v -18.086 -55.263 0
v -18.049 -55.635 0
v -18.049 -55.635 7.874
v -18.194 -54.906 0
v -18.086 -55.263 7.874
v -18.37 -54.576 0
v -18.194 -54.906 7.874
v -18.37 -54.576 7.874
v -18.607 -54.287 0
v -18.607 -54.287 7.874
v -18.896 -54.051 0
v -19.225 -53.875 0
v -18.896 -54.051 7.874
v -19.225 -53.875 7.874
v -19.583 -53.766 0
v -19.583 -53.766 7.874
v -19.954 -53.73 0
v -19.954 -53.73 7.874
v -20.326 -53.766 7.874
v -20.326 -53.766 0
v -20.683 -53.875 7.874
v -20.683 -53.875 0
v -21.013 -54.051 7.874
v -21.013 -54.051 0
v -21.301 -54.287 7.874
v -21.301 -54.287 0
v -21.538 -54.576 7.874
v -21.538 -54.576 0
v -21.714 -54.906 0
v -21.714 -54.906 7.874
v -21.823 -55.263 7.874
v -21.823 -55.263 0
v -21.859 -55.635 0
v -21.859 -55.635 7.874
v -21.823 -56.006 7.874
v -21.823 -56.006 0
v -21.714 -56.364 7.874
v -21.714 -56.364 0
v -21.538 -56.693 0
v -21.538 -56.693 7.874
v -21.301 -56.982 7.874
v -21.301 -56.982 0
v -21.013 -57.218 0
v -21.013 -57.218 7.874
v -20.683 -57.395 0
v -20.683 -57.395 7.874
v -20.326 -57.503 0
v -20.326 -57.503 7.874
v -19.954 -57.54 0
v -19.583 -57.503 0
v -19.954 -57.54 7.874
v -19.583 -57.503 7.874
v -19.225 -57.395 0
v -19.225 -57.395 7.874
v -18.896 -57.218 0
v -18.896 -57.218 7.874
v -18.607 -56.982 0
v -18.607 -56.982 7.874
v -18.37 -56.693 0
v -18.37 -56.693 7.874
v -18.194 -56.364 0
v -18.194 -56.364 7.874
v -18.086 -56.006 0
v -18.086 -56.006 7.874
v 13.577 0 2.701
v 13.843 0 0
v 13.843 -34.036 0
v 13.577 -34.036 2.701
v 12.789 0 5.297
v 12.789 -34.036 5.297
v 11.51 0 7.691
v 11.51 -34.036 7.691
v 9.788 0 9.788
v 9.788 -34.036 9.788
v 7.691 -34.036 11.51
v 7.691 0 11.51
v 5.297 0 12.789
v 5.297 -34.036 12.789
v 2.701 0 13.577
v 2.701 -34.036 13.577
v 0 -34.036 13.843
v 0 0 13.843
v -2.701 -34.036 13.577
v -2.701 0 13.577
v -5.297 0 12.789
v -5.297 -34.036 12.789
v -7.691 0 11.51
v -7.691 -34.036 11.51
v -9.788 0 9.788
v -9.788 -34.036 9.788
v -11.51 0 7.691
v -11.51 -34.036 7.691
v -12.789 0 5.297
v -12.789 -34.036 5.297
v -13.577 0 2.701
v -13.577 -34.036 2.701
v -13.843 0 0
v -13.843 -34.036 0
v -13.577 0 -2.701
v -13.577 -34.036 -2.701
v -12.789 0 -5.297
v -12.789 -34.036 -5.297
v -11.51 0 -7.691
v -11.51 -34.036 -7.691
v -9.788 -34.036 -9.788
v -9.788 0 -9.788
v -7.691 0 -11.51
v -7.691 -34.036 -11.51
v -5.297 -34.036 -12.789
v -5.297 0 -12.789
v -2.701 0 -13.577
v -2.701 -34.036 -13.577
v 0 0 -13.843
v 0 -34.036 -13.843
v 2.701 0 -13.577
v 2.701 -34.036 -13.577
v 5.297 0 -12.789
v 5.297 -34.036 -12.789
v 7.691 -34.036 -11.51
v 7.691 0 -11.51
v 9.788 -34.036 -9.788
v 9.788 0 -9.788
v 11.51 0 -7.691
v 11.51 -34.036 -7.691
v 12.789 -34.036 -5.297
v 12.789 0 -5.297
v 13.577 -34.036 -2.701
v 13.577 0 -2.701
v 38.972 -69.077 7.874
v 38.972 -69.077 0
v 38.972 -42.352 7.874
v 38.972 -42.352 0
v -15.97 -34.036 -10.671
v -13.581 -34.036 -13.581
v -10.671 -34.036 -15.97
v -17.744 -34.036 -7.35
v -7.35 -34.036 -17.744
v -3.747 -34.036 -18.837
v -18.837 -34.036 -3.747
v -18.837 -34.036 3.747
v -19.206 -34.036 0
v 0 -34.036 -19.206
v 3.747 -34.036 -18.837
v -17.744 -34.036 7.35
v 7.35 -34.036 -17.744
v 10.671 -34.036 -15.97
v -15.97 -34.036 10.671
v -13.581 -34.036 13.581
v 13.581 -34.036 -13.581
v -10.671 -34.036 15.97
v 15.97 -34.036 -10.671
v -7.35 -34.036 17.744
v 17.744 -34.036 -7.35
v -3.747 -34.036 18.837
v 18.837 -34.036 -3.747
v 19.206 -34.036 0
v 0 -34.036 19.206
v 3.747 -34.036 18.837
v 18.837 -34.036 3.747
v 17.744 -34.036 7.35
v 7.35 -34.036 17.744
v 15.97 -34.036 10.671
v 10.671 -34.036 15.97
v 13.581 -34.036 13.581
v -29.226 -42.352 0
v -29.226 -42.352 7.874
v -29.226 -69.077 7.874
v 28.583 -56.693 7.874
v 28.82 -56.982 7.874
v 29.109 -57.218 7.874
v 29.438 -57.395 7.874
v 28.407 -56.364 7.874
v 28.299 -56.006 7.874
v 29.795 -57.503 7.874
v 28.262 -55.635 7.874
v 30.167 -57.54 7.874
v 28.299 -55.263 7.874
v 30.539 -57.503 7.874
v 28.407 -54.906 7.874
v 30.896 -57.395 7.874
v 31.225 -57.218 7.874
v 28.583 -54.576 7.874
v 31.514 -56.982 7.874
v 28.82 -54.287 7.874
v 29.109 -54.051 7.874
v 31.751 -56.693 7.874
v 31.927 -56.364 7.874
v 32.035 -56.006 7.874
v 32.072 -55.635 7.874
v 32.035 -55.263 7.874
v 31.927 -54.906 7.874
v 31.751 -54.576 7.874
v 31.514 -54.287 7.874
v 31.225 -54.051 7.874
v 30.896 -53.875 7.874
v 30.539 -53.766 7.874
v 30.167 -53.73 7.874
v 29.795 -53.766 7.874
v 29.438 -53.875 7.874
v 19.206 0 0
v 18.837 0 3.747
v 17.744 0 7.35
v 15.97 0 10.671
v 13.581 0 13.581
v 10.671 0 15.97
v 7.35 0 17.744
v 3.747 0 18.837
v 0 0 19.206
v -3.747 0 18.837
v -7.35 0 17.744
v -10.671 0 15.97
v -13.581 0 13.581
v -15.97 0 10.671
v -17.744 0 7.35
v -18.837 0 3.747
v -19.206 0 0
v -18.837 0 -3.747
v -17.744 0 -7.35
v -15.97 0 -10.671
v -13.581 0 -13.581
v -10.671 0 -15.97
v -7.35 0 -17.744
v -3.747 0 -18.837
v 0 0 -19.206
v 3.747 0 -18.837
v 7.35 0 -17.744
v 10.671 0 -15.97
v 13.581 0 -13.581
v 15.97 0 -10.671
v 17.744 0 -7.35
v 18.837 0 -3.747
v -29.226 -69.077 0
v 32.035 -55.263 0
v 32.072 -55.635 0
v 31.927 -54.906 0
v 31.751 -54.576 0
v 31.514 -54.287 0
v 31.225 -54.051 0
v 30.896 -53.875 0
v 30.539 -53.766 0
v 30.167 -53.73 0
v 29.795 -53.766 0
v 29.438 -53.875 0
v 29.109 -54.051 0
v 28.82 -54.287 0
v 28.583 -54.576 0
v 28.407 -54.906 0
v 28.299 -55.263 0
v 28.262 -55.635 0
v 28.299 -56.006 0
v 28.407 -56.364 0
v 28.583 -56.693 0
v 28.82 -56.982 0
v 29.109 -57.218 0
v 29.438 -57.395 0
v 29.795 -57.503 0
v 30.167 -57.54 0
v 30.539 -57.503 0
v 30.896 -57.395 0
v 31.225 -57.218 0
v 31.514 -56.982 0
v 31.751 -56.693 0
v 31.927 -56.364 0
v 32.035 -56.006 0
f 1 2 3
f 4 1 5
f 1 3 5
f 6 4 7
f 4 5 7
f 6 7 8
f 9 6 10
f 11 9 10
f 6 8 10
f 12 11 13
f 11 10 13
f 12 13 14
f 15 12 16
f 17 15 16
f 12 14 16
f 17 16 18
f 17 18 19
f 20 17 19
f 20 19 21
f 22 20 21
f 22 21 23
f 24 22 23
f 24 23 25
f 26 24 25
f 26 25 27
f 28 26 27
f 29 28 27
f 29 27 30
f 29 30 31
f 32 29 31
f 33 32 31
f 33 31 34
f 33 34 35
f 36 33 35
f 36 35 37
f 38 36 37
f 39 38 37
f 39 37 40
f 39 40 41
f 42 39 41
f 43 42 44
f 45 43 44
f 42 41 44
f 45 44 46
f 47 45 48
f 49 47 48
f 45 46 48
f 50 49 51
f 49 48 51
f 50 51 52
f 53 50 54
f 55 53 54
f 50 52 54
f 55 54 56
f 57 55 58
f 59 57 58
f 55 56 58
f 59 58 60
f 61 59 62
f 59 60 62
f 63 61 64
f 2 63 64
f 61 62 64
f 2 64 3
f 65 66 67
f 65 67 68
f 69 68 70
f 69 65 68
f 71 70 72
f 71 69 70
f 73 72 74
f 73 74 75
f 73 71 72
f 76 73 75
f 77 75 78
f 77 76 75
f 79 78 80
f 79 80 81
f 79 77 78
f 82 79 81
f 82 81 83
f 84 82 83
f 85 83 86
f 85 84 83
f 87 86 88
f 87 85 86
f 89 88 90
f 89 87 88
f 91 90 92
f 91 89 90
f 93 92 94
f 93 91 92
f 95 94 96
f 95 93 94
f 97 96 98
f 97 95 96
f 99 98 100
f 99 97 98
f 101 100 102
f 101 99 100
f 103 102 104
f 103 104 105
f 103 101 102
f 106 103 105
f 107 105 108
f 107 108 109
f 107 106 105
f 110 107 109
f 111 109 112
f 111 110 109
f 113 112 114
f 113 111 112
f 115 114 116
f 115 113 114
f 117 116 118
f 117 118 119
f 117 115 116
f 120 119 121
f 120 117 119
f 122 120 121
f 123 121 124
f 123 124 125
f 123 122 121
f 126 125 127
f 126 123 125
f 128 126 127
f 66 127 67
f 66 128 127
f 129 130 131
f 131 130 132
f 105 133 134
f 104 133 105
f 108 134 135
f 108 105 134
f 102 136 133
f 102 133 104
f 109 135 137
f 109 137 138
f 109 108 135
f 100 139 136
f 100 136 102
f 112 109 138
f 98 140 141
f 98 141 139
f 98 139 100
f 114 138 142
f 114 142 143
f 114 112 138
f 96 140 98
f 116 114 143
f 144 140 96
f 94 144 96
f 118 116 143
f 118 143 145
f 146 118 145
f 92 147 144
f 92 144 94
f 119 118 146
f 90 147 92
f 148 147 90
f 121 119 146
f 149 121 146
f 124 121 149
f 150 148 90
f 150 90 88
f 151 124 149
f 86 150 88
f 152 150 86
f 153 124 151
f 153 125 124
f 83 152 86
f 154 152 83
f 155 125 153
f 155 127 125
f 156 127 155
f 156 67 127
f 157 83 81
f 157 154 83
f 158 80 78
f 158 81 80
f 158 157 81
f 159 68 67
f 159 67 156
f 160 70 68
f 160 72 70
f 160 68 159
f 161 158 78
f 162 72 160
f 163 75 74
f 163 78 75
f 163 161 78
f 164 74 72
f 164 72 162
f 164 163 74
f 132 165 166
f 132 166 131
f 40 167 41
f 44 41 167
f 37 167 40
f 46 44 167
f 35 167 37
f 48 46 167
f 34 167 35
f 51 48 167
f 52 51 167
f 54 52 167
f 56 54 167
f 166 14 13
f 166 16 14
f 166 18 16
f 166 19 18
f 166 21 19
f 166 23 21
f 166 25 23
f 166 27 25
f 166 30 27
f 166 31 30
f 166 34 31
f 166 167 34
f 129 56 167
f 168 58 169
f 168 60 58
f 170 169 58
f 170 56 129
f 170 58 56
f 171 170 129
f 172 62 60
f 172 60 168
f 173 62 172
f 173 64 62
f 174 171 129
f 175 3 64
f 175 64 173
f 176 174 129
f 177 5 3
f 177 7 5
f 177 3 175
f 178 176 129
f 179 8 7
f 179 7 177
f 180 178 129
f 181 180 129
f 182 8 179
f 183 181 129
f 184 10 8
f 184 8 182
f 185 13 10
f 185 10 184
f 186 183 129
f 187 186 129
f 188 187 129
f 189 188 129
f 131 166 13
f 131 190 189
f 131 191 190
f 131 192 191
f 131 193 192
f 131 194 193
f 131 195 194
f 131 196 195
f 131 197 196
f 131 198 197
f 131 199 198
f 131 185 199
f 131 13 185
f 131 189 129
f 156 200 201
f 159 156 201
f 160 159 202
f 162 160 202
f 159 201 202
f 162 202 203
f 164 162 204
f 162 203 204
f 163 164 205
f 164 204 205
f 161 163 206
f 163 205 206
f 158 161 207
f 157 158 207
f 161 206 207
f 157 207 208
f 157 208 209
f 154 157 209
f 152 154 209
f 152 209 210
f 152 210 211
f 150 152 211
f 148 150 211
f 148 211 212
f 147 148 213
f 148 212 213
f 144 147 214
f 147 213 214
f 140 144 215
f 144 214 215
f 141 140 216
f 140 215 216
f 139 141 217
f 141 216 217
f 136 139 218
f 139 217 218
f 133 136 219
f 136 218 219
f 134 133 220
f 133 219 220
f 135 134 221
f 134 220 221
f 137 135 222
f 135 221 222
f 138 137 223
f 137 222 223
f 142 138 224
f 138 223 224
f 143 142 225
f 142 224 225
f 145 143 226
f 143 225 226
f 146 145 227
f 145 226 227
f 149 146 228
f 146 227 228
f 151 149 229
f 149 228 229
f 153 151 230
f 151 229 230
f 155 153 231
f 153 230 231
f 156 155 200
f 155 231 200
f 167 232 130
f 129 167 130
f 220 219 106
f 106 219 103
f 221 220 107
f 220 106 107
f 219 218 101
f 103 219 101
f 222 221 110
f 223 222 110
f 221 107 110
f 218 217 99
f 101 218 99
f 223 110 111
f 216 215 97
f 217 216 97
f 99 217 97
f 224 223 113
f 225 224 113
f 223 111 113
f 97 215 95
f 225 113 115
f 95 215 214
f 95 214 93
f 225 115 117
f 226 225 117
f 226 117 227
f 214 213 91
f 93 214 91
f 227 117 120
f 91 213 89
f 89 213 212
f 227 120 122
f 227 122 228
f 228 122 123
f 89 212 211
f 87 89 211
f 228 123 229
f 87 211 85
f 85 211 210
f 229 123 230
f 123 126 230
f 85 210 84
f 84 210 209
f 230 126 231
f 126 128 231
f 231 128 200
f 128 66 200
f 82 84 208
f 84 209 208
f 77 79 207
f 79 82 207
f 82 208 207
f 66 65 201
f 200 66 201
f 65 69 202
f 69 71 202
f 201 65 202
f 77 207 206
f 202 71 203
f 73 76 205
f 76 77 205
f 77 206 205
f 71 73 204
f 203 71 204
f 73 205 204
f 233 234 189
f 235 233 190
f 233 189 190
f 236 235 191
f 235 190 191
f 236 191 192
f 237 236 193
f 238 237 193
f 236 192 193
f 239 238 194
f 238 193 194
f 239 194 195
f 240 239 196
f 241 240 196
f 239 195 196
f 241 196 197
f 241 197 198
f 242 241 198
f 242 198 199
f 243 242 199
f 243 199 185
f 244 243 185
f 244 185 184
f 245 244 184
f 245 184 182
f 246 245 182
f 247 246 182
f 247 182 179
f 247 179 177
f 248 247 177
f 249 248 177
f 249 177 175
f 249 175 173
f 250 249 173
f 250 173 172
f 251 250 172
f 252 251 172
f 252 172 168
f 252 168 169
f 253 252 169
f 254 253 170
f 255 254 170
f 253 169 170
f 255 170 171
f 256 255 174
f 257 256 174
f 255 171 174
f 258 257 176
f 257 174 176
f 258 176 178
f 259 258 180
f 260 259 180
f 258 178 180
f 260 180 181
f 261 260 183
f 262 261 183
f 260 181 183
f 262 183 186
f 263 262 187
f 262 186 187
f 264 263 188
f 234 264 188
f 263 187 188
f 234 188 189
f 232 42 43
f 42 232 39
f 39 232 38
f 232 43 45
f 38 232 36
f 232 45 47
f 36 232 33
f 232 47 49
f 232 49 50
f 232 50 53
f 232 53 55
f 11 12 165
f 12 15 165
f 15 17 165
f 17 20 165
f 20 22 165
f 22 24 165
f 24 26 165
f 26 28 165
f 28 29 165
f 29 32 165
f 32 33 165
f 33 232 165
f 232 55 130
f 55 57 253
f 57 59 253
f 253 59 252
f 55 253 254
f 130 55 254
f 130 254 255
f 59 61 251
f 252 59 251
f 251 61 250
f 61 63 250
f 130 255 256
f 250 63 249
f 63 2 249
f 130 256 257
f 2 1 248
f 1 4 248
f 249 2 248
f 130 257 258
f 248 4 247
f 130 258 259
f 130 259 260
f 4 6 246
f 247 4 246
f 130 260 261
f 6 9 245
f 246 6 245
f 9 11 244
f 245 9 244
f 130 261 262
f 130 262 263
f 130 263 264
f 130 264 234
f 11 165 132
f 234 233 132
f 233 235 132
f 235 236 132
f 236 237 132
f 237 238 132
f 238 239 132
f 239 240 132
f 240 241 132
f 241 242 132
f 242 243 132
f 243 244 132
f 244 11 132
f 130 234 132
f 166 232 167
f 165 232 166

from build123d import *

# Parameters (mm, degrees)
F0_W     = 68.198008
F0_H     = 26.724867
F1_DEPTH = 7.874
F2_R     = 1.905
F3_DEPTH = 25.4
F4_R     = 19.206411
F4_R_2   = 13.843
F5_DEPTH = 34.036


with BuildPart() as f1:
    # F0 (on Top) → F1 (new body)
    with BuildSketch(Plane.XY):
        with Locations((4.873042, -55.714104)):
            Rectangle(F0_W, F0_H)
    extrude(amount=F1_DEPTH)

    # F2 (on face) → F3 (cut)
    with BuildSketch(Plane.XY.offset(7.874)):
        with Locations((-19.954395, -55.634532)):
            Circle(F2_R)
        with Locations((30.166939, -55.634532)):
            Circle(F2_R)
    extrude(amount=-F3_DEPTH, mode=Mode.SUBTRACT)


with BuildPart() as f5:
    # F4 (on Front) → F5 (new body)
    with BuildSketch(Plane.XZ):
        Circle(F4_R)
        Circle(F4_R_2, mode=Mode.SUBTRACT)
    extrude(amount=F5_DEPTH)


solid = Compound([f1.part, f5.part])
